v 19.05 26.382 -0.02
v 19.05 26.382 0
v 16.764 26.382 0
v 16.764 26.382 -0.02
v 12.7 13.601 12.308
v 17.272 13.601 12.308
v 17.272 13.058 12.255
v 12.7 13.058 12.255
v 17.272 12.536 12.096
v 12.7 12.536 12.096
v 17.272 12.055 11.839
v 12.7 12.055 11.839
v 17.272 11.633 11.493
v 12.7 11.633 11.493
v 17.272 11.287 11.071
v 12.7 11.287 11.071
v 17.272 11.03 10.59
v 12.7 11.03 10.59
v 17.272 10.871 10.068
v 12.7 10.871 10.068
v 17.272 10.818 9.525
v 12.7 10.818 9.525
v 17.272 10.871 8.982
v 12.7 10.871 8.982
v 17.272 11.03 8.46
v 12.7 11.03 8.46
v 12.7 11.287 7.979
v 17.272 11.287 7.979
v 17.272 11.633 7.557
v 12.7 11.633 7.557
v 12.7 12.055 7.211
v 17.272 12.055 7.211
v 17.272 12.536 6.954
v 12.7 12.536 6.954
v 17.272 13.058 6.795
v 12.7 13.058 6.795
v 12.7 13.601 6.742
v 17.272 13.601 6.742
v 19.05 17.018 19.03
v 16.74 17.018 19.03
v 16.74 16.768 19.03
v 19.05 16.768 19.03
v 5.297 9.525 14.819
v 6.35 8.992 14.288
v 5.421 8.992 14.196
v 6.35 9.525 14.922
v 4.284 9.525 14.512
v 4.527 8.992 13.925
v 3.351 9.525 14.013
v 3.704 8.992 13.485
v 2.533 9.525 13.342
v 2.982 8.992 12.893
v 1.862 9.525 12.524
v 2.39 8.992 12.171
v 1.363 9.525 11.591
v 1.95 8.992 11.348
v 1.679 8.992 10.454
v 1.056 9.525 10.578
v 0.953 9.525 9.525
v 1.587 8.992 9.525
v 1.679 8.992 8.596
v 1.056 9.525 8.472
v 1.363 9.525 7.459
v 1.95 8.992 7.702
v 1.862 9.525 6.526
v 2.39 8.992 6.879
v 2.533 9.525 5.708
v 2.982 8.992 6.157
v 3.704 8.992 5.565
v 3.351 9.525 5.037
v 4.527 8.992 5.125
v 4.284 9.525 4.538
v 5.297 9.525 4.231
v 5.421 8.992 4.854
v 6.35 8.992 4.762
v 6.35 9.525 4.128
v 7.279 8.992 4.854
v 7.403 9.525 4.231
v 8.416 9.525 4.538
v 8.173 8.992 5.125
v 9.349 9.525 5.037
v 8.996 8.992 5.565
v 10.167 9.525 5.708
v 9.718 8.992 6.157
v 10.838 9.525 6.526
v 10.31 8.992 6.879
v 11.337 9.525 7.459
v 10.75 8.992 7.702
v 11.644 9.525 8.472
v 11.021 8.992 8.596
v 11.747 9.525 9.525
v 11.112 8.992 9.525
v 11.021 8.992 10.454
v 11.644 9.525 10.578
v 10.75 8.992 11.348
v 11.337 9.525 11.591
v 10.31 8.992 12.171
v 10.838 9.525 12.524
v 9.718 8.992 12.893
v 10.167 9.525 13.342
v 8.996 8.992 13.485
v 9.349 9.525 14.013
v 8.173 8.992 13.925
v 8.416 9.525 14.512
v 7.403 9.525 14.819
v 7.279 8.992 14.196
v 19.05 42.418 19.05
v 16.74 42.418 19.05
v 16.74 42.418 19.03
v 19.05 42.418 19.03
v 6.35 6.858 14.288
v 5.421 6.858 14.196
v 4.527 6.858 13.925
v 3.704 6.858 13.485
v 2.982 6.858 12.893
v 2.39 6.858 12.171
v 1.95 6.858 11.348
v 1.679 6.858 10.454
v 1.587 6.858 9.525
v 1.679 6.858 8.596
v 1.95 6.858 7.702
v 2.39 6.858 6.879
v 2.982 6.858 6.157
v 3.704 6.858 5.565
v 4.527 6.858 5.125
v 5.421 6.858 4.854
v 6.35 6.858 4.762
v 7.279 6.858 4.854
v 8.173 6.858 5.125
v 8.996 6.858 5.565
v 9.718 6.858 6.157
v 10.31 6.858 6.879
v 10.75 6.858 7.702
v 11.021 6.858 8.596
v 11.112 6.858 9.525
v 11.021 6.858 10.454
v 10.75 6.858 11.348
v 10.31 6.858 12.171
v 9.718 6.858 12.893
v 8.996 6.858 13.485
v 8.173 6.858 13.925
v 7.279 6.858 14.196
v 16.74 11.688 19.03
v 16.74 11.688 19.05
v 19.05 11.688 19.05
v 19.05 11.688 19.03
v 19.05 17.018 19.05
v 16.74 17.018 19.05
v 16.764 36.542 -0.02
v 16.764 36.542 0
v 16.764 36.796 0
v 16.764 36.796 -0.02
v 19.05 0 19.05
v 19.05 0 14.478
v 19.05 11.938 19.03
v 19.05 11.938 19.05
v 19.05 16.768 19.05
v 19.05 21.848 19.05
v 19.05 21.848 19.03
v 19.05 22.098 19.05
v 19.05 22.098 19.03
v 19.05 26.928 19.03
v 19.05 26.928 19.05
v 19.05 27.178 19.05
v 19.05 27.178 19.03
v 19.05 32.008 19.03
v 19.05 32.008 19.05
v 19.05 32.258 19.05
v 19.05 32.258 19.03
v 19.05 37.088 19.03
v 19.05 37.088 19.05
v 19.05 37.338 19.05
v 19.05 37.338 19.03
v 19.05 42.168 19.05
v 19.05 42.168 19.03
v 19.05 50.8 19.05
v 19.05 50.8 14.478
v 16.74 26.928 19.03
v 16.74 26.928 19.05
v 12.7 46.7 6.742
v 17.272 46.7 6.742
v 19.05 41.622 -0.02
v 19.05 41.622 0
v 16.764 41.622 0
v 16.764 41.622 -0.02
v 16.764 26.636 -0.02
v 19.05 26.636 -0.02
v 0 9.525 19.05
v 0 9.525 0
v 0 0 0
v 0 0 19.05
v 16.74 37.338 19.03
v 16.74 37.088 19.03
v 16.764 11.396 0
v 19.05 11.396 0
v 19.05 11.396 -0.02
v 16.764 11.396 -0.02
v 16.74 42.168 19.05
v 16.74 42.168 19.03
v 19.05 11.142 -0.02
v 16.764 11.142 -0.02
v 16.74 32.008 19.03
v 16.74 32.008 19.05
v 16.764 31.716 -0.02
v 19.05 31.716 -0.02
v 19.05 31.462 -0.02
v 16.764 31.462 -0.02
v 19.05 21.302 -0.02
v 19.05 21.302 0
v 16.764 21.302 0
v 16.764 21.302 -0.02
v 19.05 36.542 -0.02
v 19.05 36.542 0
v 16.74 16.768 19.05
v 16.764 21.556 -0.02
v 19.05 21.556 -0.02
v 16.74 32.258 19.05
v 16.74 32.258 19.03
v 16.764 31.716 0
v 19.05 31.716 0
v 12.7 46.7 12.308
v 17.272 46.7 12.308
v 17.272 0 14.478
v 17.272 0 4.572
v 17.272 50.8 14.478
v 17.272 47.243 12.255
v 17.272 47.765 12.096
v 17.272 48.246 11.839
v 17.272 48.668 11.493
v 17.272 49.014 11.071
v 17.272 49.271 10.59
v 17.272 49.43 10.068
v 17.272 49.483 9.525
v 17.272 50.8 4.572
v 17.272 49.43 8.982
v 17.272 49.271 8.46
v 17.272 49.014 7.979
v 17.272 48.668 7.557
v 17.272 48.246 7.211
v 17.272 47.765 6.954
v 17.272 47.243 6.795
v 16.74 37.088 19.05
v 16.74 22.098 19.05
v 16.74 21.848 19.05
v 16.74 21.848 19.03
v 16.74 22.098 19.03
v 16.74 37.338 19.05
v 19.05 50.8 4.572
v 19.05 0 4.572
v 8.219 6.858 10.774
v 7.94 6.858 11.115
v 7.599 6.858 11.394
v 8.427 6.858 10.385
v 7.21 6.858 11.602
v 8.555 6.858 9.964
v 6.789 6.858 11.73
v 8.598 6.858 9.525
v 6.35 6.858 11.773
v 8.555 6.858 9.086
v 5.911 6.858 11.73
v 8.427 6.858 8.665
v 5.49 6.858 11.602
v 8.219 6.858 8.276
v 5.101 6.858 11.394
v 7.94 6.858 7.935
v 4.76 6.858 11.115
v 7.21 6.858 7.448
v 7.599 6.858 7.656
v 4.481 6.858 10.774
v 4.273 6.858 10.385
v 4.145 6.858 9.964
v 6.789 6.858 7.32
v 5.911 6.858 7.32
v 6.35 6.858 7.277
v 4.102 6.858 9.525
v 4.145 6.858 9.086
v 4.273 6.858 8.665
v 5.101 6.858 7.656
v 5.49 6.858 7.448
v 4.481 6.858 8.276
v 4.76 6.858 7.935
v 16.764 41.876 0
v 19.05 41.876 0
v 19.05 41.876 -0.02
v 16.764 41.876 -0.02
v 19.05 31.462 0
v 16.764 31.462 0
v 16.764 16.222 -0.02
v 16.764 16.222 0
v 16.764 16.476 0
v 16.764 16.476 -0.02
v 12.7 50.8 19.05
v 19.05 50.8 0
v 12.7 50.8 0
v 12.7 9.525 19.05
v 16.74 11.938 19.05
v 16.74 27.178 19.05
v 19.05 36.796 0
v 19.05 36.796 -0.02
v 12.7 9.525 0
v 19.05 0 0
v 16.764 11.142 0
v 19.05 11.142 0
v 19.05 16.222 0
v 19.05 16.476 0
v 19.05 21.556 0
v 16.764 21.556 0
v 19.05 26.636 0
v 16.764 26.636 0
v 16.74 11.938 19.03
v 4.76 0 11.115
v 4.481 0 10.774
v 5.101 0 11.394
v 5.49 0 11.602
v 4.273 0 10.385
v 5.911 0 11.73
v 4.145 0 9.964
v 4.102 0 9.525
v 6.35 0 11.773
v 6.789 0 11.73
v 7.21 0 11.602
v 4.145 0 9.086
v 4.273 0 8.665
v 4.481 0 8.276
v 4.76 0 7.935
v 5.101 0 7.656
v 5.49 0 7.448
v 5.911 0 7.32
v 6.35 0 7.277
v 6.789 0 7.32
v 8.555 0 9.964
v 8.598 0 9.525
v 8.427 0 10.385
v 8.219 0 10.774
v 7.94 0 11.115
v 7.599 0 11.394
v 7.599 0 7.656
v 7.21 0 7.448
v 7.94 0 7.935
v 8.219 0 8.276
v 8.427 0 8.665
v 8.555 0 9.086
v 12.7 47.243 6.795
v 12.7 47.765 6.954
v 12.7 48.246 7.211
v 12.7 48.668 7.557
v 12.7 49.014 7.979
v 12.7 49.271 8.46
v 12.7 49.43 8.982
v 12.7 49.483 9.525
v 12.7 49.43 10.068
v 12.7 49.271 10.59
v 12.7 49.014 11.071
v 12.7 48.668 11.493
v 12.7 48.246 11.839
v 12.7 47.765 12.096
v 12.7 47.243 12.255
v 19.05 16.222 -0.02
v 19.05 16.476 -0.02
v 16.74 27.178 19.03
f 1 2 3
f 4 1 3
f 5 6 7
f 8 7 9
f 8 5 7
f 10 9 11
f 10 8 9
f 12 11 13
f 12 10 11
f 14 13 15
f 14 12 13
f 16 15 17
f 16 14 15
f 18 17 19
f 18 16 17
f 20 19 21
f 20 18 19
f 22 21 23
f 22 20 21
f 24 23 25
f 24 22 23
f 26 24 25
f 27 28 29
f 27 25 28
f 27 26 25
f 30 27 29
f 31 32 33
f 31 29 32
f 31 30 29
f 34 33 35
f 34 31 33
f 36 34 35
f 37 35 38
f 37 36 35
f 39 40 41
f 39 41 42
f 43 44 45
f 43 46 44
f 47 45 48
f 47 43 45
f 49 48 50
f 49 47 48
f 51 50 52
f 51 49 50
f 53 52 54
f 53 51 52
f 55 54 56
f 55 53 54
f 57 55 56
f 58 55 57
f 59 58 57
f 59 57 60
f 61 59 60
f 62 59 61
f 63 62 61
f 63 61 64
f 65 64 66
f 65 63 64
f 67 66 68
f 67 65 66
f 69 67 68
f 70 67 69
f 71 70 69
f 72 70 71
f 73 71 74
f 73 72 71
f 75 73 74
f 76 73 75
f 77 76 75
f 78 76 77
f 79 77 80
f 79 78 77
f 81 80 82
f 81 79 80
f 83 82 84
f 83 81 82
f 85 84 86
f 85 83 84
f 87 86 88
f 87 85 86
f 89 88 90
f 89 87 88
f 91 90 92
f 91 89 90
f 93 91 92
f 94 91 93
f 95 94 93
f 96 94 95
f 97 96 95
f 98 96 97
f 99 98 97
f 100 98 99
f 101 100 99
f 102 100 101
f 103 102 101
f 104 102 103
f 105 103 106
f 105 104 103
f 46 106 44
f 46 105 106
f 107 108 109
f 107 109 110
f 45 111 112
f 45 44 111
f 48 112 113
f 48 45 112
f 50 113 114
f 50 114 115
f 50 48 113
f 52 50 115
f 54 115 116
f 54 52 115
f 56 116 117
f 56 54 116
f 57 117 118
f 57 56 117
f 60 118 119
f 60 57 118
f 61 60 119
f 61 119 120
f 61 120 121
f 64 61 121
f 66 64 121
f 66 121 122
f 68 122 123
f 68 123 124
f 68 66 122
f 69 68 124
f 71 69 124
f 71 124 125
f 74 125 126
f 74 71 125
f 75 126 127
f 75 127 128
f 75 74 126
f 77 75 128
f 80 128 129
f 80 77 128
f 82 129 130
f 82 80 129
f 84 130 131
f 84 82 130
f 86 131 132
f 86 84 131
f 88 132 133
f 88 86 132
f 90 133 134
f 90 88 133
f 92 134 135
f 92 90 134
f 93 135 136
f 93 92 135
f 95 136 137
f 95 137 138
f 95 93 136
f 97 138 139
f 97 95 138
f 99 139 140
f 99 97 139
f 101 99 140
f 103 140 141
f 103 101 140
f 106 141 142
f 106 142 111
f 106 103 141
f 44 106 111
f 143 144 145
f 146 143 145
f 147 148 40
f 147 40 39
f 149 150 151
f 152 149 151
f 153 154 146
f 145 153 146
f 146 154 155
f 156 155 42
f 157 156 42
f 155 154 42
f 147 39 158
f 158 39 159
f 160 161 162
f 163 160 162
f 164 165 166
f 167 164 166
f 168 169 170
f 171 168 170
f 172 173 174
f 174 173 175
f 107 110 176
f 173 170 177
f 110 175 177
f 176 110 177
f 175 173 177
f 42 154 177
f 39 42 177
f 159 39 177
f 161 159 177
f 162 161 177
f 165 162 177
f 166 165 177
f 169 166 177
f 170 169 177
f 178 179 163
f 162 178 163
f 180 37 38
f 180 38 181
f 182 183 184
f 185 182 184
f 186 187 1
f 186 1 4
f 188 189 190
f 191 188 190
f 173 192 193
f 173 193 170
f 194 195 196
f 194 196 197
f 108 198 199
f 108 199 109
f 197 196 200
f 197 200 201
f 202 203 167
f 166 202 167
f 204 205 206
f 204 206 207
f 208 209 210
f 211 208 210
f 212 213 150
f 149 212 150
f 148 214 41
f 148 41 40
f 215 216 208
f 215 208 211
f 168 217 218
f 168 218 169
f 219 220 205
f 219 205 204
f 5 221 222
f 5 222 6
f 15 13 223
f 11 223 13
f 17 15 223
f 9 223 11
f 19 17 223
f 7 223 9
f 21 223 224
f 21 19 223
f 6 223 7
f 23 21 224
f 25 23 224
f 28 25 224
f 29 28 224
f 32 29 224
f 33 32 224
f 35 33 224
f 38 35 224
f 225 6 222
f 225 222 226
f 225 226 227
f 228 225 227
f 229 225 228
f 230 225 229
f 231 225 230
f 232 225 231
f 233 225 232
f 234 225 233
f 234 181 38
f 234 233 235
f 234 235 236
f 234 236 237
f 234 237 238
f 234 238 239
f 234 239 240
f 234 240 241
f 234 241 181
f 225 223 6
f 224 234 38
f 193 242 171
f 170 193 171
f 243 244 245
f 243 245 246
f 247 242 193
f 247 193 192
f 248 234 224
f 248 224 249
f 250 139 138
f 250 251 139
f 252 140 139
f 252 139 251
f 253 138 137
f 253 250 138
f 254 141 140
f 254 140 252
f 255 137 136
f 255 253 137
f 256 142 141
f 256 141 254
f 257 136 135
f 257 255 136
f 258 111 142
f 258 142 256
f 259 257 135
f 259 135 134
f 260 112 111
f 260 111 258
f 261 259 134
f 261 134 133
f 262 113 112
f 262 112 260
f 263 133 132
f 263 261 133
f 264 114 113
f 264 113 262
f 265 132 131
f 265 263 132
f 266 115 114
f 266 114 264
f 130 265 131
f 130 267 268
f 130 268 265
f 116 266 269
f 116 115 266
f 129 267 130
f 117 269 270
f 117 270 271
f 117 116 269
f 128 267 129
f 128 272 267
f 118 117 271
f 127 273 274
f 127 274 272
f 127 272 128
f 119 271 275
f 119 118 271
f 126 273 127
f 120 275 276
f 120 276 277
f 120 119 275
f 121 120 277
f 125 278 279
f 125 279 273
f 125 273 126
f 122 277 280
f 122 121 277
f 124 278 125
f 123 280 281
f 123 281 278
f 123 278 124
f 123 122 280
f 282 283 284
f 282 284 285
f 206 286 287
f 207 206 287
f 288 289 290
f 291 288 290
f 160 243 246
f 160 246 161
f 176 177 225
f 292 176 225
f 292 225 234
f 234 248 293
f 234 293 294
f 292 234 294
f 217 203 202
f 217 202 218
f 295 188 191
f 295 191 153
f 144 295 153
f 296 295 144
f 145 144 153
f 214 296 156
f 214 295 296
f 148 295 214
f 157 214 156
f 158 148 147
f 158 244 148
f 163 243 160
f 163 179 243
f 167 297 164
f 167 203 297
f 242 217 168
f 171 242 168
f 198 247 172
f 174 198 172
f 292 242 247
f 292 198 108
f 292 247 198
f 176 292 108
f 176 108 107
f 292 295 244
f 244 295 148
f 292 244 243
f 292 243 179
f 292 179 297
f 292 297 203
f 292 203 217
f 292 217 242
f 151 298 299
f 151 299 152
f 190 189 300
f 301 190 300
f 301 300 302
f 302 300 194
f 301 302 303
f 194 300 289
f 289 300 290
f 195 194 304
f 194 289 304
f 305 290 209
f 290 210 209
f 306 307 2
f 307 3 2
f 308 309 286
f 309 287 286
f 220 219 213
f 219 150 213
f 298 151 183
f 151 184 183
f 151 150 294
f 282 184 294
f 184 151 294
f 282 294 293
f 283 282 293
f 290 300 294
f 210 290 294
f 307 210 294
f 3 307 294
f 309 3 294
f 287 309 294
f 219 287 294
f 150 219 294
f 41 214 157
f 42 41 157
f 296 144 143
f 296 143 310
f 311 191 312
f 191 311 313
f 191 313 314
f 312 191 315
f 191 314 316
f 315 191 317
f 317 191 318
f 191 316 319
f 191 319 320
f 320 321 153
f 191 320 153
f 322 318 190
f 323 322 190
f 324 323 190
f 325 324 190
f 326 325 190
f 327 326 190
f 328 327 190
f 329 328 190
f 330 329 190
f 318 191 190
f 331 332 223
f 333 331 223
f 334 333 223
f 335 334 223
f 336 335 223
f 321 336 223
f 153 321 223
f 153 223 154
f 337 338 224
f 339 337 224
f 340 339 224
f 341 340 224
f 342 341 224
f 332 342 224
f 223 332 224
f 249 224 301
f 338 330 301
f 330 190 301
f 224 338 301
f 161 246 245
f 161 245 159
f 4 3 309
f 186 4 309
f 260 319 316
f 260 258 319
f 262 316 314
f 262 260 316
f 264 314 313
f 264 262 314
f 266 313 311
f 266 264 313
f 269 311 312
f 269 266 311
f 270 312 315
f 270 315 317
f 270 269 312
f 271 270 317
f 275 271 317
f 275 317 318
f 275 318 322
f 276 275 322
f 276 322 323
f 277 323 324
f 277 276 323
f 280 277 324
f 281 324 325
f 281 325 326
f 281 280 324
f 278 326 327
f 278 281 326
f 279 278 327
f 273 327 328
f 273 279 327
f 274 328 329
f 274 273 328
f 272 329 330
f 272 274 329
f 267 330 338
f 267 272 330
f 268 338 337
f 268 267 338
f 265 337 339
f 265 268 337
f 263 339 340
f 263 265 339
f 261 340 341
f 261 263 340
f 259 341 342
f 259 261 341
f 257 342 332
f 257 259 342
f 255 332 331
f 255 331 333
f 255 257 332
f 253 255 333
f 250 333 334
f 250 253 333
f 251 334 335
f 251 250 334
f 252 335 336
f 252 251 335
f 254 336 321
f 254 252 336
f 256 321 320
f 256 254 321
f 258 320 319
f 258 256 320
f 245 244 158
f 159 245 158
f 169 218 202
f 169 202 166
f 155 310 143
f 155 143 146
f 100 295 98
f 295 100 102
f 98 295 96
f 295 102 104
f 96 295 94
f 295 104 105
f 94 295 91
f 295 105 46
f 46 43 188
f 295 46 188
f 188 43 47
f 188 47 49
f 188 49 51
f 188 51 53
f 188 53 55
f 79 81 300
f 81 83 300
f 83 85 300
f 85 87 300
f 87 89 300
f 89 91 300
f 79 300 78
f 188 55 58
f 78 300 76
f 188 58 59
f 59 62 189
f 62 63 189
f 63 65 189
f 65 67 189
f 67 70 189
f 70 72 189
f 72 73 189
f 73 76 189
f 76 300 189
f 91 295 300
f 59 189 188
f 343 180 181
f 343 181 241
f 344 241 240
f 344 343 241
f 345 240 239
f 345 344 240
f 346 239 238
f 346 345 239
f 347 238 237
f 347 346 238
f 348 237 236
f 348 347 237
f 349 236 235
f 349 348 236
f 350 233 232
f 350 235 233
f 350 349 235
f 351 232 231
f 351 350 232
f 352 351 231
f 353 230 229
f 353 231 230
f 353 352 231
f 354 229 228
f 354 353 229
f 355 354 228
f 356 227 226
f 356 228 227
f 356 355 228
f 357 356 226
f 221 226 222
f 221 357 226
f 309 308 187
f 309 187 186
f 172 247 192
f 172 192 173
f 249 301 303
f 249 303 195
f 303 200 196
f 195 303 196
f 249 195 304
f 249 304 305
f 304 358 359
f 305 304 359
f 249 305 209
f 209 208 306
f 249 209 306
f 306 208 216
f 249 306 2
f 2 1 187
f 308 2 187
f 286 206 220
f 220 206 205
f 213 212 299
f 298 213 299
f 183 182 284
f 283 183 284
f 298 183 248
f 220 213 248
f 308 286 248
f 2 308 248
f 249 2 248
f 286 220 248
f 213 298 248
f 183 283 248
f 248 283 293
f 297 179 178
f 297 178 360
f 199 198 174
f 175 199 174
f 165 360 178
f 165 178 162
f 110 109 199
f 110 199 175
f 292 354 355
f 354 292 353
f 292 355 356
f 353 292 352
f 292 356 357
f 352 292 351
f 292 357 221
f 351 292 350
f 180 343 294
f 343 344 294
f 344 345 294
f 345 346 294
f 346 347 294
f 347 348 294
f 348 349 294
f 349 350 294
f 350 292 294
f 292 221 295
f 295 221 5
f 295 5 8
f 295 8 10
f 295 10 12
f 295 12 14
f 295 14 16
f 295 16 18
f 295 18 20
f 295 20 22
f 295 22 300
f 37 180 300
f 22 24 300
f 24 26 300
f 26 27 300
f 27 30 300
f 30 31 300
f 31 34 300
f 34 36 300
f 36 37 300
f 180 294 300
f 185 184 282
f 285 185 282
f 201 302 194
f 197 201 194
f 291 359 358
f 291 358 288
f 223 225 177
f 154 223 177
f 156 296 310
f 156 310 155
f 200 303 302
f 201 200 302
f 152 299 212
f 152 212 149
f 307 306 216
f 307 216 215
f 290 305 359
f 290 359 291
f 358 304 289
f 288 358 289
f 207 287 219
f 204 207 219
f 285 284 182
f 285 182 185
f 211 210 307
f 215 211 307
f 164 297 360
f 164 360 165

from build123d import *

# Parameters (mm, degrees)
BOSS_EXTRUDE1_DEPTH = 19.05
CUT_EXTRUDE1_REACH  = 8.35
SKETCH6_W           = 1.778
SKETCH6_H           = 9.906
CUT_EXTRUDE2_DEPTH  = 50.8
SKETCH11_W          = 2.310054712
SKETCH11_H          = 0.25
CUT_EXTRUDE3_DEPTH  = 0.02
LPATTERN1_COUNT     = 7
LPATTERN1_PITCH     = 5.08
SKETCH13_W          = 2.286
SKETCH13_H          = 0.254
BOSS_EXTRUDE2_DEPTH = 0.02
LPATTERN2_COUNT     = 7
LPATTERN2_PITCH     = 5.08


with BuildPart() as part:
    # Sketch1 → Boss-Extrude1 (new body)
    with BuildSketch(Plane.XY):
        Polygon((0, 0), (19.05, 0), (19.05, 50.8), (12.7, 50.8), (12.7, 9.525), (0, 9.525), align=None)
    extrude(amount=BOSS_EXTRUDE1_DEPTH)

    # Sketch4 → Cut-Extrude1 (cut, up to next)
    with BuildSketch(Plane.ZY.offset(-12.7), mode=Mode.PRIVATE) as cut_extrude1_sk1:
        with BuildLine():
            Line((6.742001962, 13.600990631), (6.742001962, 46.700186434))
            ThreePointArc((6.742001962, 46.700186434), (9.525, 49.483184472), (12.307998038, 46.700186434))
            Line((12.307998038, 46.700186434), (12.307998038, 13.600990631))
            ThreePointArc((12.307998038, 13.600990631), (9.525, 10.817992593), (6.742001962, 13.600990631))
        make_face()
    cut_extrude1_tool1 = extrude(cut_extrude1_sk1.sketch, amount=-CUT_EXTRUDE1_REACH, mode=Mode.PRIVATE) & part.part
    add(cut_extrude1_tool1.solids().sort_by_distance((12.7, 30.150589, 9.525))[0], mode=Mode.SUBTRACT)

    # Sketch6 → Cut-Extrude2 (cut)
    with BuildSketch(Plane(origin=(0, 50.8, 0), x_dir=(1, 0, 0), z_dir=(0, 1, 0))):
        with Locations((18.161, -9.525)):
            Rectangle(SKETCH6_W, SKETCH6_H)
    extrude(amount=-CUT_EXTRUDE2_DEPTH, mode=Mode.SUBTRACT)

    # Sketch9 → CBORE for #8 Binding Head Machine Screw1 (revolve, cut)
    with BuildSketch(Plane(origin=(6.35, 9.525, 9.525), x_dir=(0, 0, 1), z_dir=(1, 0, 0))):
        Polygon((0, 0), (0, 9.525), (2.2479, 9.525), (2.2479, 2.667), (4.7625, 2.667), (4.7625, 0.532828266), (5.3975, 0), align=None)
    revolve(axis=Axis((6.35, 15.875, 9.525), (0, -1, 0)), mode=Mode.SUBTRACT)

    # Sketch11 → Cut-Extrude3 (cut)
    with BuildSketch(Plane.XY.offset(19.05)):
        with Locations((17.894972644, 42.293)):
            Rectangle(SKETCH11_W, SKETCH11_H)
    cut_extrude3 = extrude(amount=-CUT_EXTRUDE3_DEPTH, mode=Mode.SUBTRACT)

    # LPattern1: Cut-Extrude3 ×7
    with Locations(*[(0, -i * LPATTERN1_PITCH, 0) for i in range(1, LPATTERN1_COUNT)]):
        add(cut_extrude3, mode=Mode.SUBTRACT)

    # Sketch13 → Boss-Extrude2 (add)
    with BuildSketch(Plane(origin=(0, 0, 0), x_dir=(-1, 0, 0), z_dir=(0, 0, -1))):
        with Locations((-17.907, 41.749020167)):
            Rectangle(SKETCH13_W, SKETCH13_H)
    boss_extrude2 = extrude(amount=BOSS_EXTRUDE2_DEPTH)

    # LPattern2: Boss-Extrude2 ×7
    with Locations(*[(0, -i * LPATTERN2_PITCH, 0) for i in range(1, LPATTERN2_COUNT)]):
        add(boss_extrude2)


solid = part.part
